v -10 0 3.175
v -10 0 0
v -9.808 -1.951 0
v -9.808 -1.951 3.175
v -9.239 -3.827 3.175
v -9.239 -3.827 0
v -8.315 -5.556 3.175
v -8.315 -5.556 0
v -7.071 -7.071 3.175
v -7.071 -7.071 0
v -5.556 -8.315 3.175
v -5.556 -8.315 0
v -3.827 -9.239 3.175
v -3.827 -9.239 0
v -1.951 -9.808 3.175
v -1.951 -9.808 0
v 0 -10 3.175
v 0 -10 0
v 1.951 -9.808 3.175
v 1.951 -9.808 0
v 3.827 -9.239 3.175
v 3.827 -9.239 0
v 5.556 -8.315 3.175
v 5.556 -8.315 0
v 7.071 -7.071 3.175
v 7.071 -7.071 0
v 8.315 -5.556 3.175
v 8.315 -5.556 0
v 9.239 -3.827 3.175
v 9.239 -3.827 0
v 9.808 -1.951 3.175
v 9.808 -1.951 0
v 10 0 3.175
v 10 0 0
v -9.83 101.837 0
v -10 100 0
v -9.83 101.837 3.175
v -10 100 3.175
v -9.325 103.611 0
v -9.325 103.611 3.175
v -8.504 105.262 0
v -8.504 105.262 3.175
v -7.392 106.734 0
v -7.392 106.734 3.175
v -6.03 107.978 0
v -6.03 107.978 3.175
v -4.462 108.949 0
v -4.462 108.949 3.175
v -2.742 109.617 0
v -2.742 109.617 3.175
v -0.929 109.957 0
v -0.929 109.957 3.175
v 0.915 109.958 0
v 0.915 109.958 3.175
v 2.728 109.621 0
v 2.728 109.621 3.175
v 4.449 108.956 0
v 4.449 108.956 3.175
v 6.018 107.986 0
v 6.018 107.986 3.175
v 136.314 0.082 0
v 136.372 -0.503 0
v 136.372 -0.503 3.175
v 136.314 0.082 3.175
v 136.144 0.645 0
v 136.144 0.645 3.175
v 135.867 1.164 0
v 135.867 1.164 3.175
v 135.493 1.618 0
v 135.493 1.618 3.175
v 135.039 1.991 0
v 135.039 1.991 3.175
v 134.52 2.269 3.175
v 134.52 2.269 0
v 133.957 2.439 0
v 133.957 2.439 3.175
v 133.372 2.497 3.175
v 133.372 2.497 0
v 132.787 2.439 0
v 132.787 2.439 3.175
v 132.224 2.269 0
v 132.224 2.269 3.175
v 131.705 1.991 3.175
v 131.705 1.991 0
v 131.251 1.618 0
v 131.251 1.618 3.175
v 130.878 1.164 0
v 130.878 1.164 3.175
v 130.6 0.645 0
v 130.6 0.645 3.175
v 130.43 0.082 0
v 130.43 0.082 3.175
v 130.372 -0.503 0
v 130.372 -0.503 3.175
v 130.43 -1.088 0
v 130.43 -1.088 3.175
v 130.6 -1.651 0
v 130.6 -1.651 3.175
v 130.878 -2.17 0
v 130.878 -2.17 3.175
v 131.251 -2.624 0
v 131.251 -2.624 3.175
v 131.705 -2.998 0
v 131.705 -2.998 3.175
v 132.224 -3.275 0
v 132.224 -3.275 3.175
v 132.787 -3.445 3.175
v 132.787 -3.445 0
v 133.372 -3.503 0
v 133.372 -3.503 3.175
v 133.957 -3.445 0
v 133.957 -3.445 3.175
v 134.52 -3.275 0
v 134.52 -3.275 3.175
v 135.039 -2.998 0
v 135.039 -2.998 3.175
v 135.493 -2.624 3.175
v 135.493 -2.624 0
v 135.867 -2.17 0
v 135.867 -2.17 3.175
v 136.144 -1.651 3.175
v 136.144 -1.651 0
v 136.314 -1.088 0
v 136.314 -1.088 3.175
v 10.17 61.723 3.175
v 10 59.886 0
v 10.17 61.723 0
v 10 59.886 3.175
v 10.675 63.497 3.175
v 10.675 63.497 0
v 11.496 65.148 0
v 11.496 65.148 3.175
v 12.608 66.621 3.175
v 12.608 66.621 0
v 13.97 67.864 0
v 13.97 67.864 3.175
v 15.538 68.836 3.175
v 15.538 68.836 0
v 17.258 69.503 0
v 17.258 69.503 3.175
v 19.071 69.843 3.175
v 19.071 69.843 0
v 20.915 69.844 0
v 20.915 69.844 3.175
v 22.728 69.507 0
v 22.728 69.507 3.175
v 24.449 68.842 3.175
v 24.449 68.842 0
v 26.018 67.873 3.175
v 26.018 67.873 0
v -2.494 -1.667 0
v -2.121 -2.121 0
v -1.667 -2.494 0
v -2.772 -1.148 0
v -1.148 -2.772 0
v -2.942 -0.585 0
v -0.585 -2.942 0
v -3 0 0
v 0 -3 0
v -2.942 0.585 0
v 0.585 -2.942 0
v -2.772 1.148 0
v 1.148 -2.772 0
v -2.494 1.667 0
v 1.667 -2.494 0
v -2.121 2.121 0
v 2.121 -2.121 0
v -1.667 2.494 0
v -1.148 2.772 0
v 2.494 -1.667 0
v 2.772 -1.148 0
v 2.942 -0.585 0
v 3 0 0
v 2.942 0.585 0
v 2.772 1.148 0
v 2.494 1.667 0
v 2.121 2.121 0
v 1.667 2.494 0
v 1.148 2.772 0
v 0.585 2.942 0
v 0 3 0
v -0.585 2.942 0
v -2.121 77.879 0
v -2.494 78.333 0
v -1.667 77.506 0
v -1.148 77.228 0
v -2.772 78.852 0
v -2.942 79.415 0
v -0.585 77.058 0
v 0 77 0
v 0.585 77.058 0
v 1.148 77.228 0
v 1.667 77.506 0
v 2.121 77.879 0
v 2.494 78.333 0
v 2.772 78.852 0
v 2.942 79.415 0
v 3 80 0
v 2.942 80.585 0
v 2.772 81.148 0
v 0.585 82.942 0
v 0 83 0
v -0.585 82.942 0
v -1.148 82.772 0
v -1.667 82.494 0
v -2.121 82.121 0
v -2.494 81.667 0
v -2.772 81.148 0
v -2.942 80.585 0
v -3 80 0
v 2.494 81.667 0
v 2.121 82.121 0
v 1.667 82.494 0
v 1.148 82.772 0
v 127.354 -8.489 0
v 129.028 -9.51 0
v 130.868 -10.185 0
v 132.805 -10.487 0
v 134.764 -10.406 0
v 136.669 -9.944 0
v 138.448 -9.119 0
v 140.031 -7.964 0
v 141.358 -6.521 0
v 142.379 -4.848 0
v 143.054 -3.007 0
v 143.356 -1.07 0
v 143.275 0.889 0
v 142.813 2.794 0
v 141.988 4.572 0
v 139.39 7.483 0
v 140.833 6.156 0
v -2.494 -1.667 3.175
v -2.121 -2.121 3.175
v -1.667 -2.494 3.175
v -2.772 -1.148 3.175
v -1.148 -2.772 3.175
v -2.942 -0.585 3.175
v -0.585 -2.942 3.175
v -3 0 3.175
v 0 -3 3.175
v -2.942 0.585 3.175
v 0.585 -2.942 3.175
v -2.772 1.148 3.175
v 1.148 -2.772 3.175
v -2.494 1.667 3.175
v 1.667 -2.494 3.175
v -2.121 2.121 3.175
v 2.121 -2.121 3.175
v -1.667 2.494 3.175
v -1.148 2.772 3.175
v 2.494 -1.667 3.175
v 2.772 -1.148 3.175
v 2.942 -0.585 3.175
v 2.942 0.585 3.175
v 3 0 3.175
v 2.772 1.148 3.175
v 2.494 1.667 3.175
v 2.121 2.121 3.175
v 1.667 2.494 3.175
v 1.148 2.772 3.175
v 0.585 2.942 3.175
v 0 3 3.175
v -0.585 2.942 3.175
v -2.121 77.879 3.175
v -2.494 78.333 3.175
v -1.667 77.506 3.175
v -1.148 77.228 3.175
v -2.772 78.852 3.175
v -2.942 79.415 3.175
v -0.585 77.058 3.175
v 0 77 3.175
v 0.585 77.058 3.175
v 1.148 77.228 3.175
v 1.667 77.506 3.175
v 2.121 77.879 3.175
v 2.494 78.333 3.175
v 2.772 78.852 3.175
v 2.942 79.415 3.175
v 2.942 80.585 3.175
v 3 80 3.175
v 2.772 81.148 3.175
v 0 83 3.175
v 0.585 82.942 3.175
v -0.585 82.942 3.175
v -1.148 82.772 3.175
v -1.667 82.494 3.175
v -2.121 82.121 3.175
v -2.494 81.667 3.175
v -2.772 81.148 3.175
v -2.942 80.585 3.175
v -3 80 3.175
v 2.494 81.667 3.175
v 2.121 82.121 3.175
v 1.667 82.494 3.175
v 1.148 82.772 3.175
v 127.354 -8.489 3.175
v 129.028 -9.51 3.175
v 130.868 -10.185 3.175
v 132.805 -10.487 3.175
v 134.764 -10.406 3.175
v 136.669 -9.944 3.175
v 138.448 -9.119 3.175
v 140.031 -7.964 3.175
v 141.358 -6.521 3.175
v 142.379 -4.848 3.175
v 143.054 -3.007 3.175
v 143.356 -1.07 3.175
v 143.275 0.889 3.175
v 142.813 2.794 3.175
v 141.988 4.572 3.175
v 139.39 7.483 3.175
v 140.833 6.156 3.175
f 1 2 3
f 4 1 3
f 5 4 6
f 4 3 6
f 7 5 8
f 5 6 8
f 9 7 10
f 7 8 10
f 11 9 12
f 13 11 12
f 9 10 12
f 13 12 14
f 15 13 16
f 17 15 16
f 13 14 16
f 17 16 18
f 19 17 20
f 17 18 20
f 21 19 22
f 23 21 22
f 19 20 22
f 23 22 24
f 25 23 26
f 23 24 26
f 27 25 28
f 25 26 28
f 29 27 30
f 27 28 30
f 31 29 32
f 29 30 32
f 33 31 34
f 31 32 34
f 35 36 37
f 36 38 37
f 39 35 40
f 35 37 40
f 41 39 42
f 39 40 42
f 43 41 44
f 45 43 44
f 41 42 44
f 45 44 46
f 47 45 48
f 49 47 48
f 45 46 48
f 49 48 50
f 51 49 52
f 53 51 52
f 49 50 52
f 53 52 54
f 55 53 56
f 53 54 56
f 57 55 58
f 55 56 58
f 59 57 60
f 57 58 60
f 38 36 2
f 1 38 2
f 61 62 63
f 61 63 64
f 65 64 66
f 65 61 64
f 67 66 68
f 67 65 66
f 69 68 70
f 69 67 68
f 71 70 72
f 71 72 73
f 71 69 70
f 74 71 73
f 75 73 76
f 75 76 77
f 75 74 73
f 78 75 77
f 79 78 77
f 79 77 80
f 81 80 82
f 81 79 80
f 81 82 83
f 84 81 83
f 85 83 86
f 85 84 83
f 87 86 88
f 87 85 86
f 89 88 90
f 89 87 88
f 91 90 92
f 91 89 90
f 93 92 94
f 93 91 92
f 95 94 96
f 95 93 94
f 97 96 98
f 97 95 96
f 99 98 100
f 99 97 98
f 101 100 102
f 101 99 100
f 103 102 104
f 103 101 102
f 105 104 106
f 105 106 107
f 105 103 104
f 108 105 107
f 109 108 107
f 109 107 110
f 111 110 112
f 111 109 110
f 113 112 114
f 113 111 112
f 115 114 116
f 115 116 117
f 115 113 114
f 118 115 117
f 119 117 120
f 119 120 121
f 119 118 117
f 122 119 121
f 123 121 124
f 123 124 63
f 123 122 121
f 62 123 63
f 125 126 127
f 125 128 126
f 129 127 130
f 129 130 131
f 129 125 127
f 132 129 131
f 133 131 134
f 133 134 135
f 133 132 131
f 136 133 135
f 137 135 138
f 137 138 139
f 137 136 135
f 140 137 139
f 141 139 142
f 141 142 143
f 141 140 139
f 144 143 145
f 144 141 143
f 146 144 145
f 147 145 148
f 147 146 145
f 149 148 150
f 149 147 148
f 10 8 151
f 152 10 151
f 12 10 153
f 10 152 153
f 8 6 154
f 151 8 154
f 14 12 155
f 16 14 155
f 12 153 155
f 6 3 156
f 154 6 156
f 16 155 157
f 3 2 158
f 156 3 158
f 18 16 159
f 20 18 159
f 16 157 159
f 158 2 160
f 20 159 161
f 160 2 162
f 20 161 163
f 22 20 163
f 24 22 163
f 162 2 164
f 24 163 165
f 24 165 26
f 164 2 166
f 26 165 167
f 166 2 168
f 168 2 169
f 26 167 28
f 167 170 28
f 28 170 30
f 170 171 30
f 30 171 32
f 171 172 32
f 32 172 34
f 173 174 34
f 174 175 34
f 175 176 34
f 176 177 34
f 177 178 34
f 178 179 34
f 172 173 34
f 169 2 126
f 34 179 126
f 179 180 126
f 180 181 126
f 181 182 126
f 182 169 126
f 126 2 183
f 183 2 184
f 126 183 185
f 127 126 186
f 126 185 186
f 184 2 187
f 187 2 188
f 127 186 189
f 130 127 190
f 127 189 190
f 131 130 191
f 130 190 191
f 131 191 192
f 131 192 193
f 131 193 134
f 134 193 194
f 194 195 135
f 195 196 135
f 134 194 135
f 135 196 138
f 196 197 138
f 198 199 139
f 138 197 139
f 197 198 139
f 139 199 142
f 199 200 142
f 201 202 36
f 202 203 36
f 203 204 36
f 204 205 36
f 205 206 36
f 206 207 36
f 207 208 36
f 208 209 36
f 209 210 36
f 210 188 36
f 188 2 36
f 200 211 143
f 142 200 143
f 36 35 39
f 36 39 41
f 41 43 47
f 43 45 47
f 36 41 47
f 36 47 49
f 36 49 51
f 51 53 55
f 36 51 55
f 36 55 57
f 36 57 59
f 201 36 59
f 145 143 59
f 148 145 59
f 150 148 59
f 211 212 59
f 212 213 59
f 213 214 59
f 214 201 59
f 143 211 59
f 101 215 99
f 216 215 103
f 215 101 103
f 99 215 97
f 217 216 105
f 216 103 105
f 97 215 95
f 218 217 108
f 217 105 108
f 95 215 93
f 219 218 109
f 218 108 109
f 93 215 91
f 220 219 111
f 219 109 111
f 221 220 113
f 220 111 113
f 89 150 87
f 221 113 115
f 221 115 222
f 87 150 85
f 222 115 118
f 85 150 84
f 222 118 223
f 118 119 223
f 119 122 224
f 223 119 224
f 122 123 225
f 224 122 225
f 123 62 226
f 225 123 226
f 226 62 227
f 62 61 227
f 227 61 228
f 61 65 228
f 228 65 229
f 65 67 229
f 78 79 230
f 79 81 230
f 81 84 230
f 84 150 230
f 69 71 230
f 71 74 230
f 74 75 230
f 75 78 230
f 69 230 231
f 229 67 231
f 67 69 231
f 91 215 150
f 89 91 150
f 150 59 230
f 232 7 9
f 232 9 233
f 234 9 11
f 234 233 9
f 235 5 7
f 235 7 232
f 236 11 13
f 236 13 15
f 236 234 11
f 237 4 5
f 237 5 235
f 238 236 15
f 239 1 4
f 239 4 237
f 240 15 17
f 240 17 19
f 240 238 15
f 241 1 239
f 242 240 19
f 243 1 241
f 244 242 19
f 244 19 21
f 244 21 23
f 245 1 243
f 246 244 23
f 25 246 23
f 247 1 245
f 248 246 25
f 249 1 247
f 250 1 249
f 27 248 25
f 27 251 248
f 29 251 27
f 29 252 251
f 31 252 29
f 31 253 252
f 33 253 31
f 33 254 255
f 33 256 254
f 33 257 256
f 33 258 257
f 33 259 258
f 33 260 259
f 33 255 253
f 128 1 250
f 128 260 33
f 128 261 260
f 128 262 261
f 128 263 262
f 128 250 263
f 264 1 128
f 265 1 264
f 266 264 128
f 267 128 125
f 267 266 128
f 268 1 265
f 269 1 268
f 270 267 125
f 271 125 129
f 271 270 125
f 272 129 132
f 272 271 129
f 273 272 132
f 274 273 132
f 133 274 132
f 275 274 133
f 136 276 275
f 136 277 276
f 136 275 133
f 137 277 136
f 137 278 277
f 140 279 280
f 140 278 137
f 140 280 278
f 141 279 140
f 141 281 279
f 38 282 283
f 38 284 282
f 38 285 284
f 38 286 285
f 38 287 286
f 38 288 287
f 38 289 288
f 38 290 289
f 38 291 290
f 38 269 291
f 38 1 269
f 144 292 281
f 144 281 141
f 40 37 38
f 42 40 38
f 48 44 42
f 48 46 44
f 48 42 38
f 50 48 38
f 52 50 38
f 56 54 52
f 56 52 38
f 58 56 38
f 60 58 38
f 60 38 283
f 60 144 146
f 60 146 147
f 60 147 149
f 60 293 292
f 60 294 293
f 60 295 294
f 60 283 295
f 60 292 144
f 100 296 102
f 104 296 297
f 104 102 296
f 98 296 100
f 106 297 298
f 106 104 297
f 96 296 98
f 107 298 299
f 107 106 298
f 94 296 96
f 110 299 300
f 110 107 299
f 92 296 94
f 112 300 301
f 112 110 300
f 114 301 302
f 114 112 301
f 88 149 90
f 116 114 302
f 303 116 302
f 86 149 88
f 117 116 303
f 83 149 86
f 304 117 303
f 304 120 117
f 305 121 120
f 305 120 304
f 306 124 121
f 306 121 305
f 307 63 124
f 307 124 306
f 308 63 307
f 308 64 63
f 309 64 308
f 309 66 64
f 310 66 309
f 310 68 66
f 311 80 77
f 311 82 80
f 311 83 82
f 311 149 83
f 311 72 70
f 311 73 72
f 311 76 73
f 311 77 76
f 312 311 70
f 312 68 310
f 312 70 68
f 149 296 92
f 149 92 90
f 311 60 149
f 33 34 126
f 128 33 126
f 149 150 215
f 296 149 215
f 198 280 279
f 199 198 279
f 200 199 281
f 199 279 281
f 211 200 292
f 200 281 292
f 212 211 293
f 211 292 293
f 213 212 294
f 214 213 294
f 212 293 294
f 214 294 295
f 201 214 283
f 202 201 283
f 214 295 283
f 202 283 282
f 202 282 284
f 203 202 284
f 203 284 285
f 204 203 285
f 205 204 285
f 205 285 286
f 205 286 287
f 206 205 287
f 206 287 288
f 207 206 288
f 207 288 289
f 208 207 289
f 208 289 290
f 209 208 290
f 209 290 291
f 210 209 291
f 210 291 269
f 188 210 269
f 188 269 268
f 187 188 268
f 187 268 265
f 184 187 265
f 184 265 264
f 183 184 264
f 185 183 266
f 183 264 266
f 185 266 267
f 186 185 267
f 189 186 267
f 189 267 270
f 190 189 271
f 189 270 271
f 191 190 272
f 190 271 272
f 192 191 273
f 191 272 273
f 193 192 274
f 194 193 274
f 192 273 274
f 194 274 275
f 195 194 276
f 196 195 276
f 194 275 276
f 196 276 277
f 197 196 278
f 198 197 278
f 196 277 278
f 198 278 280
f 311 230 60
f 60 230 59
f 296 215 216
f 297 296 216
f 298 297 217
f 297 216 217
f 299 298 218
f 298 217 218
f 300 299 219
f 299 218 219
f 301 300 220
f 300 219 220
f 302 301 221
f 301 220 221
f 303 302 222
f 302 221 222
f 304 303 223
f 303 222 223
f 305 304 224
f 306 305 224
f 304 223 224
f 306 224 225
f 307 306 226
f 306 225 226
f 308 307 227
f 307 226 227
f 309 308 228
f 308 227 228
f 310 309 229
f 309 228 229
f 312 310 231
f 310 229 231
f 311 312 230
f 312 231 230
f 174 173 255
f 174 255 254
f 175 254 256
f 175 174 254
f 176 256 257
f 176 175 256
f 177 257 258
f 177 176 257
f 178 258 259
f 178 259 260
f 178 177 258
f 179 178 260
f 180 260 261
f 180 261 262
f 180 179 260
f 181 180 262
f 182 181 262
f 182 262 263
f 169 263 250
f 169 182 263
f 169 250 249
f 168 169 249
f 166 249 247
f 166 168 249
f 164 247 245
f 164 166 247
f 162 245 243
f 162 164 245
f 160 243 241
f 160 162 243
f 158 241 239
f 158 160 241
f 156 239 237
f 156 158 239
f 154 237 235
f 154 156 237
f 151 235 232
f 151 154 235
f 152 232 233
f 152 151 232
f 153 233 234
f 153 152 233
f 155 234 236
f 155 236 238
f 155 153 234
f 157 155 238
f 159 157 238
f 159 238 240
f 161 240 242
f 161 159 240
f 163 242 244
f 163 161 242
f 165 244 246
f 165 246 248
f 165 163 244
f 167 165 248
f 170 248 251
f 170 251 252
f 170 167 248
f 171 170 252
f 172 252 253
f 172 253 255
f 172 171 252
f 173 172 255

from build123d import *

# Parameters (mm, degrees)
SKETCH1_R           = 3
BOSS_EXTRUDE1_DEPTH = 3.175
FILLET1_R           = 10
SKETCH2_R           = 3
CUT_EXTRUDE1_DEPTH  = 4.175


with BuildPart() as part:
    # Sketch1 → Boss-Extrude1 (new body)
    with BuildSketch(Plane.XY):
        with BuildLine():
            Line((10, 0), (10, 79.943102917))
            Line((10, 79.943102917), (127.353979946, -8.489463967))
            ThreePointArc((127.353979946, -8.489463967), (141.358485278, -6.521259098), (139.390280409, 7.483246234))
            Line((139.390280409, 7.483246234), (-10, 120.056897083))
            Line((-10, 120.056897083), (-10, 0))
            ThreePointArc((-10, 0), (0, -10), (10, 0))
        make_face()
        Circle(SKETCH1_R, mode=Mode.SUBTRACT)
        with Locations((133.372130178, -0.503108866)):
            Circle(SKETCH1_R, mode=Mode.SUBTRACT)
    extrude(amount=BOSS_EXTRUDE1_DEPTH)

    # Fillet1
    fillet1_edges = [part.edges().sort_by_distance(p)[0] for p in [
        (-10, 120.056897083, 1.5875),
        (10, 79.943102917, 1.5875),
    ]]
    fillet(fillet1_edges, radius=FILLET1_R)

    # Sketch2 → Cut-Extrude1 (cut, through all)
    with BuildSketch(Plane.XY.offset(3.175)):
        with Locations((0, 80)):
            Circle(SKETCH2_R)
    extrude(amount=-CUT_EXTRUDE1_DEPTH, mode=Mode.SUBTRACT)


solid = part.part
